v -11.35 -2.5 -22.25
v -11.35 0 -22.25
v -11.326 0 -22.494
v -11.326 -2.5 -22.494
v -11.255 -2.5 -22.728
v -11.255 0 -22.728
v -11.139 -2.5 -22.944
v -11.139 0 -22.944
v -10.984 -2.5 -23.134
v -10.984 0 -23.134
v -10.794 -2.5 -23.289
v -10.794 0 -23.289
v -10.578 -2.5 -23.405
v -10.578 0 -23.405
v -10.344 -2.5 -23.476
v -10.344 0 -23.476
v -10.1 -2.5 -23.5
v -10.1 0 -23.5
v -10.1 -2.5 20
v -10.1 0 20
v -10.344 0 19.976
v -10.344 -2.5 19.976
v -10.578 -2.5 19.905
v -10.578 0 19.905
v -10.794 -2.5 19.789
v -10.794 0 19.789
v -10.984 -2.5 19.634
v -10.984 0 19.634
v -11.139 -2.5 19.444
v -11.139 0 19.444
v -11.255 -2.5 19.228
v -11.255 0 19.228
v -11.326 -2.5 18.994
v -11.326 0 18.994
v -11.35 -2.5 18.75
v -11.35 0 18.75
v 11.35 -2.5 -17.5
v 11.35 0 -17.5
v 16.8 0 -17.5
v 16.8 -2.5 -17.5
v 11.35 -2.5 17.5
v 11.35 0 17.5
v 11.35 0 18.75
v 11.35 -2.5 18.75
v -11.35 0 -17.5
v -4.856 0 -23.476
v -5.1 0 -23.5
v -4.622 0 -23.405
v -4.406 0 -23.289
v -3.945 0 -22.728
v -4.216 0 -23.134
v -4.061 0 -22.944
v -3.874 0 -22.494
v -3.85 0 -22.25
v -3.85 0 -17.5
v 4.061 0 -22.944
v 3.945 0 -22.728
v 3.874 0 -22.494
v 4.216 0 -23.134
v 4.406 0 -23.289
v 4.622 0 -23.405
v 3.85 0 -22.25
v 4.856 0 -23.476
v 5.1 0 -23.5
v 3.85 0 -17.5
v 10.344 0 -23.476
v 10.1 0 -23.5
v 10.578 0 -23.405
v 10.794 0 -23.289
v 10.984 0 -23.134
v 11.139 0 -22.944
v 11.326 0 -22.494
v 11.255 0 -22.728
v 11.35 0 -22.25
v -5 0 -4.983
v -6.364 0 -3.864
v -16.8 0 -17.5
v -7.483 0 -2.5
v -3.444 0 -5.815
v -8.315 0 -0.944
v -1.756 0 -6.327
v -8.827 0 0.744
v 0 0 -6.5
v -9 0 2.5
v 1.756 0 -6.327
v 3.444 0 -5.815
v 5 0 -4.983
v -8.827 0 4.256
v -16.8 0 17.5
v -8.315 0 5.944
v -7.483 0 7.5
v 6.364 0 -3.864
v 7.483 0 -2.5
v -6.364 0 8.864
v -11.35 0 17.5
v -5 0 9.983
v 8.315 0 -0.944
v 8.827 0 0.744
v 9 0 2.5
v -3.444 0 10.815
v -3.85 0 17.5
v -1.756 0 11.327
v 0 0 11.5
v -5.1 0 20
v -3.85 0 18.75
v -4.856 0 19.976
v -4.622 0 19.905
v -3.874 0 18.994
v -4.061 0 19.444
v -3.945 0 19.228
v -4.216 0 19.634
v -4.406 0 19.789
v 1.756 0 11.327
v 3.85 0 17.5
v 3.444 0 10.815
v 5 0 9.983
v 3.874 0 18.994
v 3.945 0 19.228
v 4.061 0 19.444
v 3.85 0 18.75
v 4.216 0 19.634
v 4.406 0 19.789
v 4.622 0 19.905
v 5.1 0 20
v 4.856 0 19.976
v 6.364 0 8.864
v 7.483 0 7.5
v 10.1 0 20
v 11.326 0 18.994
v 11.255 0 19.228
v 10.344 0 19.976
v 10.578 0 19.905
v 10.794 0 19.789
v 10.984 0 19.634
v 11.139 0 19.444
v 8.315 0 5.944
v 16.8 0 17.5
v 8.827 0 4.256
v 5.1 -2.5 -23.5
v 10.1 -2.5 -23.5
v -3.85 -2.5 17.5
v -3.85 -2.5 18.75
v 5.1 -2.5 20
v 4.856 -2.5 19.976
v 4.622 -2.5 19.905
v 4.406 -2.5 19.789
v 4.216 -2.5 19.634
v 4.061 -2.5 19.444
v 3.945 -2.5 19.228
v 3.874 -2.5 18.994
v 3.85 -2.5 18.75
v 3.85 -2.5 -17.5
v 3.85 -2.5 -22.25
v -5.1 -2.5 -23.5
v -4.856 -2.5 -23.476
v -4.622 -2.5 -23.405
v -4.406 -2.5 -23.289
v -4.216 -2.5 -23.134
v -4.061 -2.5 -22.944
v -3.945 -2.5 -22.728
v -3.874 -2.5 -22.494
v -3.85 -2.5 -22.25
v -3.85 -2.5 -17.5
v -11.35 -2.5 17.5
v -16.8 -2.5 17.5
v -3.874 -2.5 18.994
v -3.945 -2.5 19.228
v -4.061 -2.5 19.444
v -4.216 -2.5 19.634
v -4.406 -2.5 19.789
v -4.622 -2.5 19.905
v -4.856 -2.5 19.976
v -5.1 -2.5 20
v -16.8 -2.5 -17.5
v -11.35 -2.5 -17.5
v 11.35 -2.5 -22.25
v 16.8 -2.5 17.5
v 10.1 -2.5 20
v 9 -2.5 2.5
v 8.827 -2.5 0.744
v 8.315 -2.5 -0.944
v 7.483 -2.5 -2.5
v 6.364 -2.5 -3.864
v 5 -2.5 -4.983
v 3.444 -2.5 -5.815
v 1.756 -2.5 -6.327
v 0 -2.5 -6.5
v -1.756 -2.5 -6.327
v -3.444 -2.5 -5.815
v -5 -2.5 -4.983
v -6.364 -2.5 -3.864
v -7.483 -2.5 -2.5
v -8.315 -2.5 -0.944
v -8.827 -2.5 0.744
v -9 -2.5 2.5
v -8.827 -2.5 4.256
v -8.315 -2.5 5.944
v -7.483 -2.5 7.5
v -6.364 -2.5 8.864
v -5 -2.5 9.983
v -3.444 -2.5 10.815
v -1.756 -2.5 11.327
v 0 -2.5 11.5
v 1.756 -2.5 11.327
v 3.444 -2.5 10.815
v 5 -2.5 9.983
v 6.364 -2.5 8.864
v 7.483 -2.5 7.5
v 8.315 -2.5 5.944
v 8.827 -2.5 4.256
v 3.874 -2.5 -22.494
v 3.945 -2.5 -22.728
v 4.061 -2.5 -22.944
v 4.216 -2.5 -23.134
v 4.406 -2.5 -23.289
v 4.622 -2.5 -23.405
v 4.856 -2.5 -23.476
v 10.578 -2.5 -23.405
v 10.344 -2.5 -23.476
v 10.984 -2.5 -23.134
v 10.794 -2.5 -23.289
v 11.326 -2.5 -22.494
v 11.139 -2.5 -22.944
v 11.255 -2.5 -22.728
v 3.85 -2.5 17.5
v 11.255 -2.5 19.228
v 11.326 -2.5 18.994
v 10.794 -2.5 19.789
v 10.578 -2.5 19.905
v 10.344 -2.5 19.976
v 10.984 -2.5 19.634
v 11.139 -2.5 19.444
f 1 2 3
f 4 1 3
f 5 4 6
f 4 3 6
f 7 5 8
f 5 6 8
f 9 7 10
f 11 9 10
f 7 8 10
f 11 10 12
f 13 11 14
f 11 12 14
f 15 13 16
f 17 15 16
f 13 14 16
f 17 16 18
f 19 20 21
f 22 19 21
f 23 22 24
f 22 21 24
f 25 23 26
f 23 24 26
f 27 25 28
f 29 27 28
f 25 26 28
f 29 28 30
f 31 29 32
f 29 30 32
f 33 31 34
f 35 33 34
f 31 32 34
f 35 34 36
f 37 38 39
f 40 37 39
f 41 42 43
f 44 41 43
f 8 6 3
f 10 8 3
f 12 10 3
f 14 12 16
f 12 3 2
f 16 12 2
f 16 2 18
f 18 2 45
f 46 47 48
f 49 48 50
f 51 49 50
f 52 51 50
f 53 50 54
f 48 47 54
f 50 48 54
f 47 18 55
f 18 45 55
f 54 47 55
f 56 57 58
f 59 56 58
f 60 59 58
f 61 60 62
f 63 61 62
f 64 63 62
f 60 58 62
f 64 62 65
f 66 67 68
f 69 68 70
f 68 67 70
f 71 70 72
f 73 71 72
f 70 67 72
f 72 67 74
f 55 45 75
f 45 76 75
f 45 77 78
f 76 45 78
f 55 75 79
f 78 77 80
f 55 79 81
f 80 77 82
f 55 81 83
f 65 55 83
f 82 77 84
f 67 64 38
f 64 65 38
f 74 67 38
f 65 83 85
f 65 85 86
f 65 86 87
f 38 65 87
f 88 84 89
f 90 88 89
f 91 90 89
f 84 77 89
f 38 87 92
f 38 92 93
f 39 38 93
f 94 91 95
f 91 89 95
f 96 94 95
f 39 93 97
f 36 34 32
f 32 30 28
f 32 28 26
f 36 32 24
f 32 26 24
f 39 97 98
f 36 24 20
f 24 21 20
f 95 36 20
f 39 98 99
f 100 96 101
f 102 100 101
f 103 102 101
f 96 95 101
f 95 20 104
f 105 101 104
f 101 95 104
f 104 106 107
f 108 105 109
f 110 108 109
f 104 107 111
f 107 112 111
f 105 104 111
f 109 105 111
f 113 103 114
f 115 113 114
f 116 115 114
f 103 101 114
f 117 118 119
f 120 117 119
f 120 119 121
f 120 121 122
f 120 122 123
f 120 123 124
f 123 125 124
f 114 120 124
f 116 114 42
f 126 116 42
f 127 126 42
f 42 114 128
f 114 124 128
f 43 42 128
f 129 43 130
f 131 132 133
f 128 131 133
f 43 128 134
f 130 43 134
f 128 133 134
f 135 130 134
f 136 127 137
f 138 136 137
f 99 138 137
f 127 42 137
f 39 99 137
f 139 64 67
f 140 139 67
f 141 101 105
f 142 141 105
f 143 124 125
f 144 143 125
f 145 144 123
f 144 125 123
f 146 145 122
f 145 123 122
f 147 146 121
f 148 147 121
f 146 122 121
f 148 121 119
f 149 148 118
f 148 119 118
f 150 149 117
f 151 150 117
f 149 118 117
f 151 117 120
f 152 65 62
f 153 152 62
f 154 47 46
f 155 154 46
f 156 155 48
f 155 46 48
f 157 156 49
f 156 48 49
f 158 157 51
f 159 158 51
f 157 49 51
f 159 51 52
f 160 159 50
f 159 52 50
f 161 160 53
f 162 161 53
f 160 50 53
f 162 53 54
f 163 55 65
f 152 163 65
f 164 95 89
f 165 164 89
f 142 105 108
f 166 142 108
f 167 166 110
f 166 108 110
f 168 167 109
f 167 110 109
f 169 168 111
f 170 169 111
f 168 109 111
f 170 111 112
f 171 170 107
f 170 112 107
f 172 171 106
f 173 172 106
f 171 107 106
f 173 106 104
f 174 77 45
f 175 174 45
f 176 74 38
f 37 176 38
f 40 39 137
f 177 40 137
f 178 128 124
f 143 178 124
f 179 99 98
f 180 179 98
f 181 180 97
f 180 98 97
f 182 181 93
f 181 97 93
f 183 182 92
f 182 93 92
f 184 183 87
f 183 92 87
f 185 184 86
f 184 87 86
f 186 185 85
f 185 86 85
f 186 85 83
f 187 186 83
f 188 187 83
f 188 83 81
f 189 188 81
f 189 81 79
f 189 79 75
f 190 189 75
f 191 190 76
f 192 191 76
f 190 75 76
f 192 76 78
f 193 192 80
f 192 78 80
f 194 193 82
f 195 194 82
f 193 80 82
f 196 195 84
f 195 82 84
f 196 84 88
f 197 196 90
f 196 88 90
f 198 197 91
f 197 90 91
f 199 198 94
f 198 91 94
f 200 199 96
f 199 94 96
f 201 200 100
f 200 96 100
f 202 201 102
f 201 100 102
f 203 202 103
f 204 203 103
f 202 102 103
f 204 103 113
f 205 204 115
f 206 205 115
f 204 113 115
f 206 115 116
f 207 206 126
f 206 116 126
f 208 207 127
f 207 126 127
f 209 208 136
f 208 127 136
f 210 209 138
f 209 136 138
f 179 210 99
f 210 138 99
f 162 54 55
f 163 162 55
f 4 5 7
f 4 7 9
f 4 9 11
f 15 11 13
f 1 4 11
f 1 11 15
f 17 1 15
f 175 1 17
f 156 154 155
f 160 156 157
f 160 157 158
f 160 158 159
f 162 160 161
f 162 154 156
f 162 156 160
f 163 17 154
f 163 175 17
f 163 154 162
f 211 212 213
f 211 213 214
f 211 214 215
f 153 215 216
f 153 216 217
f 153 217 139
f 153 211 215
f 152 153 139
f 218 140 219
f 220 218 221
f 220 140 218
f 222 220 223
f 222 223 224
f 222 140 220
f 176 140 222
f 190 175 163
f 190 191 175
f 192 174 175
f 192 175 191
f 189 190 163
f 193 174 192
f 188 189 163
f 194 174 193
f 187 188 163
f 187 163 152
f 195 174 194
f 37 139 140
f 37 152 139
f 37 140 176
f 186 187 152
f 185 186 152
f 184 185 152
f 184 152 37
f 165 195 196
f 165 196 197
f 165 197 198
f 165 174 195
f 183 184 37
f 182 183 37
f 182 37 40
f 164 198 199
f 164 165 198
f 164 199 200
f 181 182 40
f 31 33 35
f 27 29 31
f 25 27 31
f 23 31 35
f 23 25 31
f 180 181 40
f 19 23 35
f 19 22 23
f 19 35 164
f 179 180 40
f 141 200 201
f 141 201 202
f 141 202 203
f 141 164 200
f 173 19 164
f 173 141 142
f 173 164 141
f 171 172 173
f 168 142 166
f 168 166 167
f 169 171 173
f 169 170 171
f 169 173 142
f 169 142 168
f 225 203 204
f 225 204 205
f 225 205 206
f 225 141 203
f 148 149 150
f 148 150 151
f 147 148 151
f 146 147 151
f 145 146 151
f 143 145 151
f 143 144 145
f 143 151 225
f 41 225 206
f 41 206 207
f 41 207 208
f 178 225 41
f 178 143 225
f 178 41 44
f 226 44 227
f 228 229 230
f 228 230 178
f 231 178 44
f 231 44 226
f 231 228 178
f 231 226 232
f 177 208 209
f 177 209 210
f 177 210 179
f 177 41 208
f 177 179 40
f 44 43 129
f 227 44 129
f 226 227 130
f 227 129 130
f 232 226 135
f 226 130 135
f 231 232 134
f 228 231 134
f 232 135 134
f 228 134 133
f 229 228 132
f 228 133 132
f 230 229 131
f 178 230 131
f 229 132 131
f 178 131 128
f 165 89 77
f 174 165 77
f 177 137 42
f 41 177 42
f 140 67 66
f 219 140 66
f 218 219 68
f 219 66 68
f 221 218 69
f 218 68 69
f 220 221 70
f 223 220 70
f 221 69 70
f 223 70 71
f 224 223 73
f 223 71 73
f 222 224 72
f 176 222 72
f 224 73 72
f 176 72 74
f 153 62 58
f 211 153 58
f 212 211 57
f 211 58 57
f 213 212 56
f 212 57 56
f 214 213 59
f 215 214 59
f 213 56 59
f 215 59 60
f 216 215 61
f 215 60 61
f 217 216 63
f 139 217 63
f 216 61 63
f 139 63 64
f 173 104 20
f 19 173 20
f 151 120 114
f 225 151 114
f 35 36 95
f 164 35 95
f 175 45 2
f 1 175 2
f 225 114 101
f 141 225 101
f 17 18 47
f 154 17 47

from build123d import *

# Parameters (mm, degrees)
F1_DEPTH = 2.5


with BuildPart() as f1:
    # F0 (on Front) → F1 (new body)
    with BuildSketch(Plane.XZ):
        with BuildLine():
            Line((-11.35, 17.5), (-16.8, 17.5))
            Line((-16.8, 17.5), (-16.8, 2.5))
            Line((-16.8, 2.5), (-9, 2.5))
            ThreePointArc((-9, 2.5), (0, 11.5), (9, 2.5))
            Line((9, 2.5), (16.8, 2.5))
            Line((16.8, 2.5), (16.8, 17.5))
            Line((16.8, 17.5), (11.35, 17.5))
            Line((11.35, 17.5), (11.35, 18.75))
            ThreePointArc((11.35, 18.75), (10.983883, 19.633883), (10.1, 20))
            Line((10.1, 20), (5.1, 20))
            ThreePointArc((5.1, 20), (4.216117, 19.633883), (3.85, 18.75))
            Line((3.85, 18.75), (3.85, 17.5))
            Line((3.85, 17.5), (-3.85, 17.5))
            Line((-3.85, 17.5), (-3.85, 18.75))
            ThreePointArc((-3.85, 18.75), (-4.216117, 19.633883), (-5.1, 20))
            Line((-5.1, 20), (-10.1, 20))
            ThreePointArc((-10.1, 20), (-10.983883, 19.633883), (-11.35, 18.75))
            Line((-11.35, 18.75), (-11.35, 17.5))
        make_face()
        with BuildLine():
            Line((-9, 2.5), (-16.8, 2.5))
            Line((-16.8, 2.5), (-16.8, -17.5))
            Line((-16.8, -17.5), (-11.35, -17.5))
            Line((-11.35, -17.5), (-11.35, -22.25))
            ThreePointArc((-11.35, -22.25), (-10.983883, -23.133883), (-10.1, -23.5))
            Line((-10.1, -23.5), (-5.1, -23.5))
            ThreePointArc((-5.1, -23.5), (-4.216117, -23.133883), (-3.85, -22.25))
            Line((-3.85, -22.25), (-3.85, -17.5))
            Line((-3.85, -17.5), (3.85, -17.5))
            Line((3.85, -17.5), (3.85, -22.25))
            ThreePointArc((3.85, -22.25), (4.216117, -23.133883), (5.1, -23.5))
            Line((5.1, -23.5), (10.1, -23.5))
            ThreePointArc((10.1, -23.5), (10.983883, -23.133883), (11.35, -22.25))
            Line((11.35, -22.25), (11.35, -17.5))
            Line((11.35, -17.5), (16.8, -17.5))
            Line((16.8, -17.5), (16.8, 2.5))
            Line((16.8, 2.5), (9, 2.5))
            ThreePointArc((9, 2.5), (0, -6.5), (-9, 2.5))
        make_face()
    extrude(amount=F1_DEPTH)


solid = f1.part
